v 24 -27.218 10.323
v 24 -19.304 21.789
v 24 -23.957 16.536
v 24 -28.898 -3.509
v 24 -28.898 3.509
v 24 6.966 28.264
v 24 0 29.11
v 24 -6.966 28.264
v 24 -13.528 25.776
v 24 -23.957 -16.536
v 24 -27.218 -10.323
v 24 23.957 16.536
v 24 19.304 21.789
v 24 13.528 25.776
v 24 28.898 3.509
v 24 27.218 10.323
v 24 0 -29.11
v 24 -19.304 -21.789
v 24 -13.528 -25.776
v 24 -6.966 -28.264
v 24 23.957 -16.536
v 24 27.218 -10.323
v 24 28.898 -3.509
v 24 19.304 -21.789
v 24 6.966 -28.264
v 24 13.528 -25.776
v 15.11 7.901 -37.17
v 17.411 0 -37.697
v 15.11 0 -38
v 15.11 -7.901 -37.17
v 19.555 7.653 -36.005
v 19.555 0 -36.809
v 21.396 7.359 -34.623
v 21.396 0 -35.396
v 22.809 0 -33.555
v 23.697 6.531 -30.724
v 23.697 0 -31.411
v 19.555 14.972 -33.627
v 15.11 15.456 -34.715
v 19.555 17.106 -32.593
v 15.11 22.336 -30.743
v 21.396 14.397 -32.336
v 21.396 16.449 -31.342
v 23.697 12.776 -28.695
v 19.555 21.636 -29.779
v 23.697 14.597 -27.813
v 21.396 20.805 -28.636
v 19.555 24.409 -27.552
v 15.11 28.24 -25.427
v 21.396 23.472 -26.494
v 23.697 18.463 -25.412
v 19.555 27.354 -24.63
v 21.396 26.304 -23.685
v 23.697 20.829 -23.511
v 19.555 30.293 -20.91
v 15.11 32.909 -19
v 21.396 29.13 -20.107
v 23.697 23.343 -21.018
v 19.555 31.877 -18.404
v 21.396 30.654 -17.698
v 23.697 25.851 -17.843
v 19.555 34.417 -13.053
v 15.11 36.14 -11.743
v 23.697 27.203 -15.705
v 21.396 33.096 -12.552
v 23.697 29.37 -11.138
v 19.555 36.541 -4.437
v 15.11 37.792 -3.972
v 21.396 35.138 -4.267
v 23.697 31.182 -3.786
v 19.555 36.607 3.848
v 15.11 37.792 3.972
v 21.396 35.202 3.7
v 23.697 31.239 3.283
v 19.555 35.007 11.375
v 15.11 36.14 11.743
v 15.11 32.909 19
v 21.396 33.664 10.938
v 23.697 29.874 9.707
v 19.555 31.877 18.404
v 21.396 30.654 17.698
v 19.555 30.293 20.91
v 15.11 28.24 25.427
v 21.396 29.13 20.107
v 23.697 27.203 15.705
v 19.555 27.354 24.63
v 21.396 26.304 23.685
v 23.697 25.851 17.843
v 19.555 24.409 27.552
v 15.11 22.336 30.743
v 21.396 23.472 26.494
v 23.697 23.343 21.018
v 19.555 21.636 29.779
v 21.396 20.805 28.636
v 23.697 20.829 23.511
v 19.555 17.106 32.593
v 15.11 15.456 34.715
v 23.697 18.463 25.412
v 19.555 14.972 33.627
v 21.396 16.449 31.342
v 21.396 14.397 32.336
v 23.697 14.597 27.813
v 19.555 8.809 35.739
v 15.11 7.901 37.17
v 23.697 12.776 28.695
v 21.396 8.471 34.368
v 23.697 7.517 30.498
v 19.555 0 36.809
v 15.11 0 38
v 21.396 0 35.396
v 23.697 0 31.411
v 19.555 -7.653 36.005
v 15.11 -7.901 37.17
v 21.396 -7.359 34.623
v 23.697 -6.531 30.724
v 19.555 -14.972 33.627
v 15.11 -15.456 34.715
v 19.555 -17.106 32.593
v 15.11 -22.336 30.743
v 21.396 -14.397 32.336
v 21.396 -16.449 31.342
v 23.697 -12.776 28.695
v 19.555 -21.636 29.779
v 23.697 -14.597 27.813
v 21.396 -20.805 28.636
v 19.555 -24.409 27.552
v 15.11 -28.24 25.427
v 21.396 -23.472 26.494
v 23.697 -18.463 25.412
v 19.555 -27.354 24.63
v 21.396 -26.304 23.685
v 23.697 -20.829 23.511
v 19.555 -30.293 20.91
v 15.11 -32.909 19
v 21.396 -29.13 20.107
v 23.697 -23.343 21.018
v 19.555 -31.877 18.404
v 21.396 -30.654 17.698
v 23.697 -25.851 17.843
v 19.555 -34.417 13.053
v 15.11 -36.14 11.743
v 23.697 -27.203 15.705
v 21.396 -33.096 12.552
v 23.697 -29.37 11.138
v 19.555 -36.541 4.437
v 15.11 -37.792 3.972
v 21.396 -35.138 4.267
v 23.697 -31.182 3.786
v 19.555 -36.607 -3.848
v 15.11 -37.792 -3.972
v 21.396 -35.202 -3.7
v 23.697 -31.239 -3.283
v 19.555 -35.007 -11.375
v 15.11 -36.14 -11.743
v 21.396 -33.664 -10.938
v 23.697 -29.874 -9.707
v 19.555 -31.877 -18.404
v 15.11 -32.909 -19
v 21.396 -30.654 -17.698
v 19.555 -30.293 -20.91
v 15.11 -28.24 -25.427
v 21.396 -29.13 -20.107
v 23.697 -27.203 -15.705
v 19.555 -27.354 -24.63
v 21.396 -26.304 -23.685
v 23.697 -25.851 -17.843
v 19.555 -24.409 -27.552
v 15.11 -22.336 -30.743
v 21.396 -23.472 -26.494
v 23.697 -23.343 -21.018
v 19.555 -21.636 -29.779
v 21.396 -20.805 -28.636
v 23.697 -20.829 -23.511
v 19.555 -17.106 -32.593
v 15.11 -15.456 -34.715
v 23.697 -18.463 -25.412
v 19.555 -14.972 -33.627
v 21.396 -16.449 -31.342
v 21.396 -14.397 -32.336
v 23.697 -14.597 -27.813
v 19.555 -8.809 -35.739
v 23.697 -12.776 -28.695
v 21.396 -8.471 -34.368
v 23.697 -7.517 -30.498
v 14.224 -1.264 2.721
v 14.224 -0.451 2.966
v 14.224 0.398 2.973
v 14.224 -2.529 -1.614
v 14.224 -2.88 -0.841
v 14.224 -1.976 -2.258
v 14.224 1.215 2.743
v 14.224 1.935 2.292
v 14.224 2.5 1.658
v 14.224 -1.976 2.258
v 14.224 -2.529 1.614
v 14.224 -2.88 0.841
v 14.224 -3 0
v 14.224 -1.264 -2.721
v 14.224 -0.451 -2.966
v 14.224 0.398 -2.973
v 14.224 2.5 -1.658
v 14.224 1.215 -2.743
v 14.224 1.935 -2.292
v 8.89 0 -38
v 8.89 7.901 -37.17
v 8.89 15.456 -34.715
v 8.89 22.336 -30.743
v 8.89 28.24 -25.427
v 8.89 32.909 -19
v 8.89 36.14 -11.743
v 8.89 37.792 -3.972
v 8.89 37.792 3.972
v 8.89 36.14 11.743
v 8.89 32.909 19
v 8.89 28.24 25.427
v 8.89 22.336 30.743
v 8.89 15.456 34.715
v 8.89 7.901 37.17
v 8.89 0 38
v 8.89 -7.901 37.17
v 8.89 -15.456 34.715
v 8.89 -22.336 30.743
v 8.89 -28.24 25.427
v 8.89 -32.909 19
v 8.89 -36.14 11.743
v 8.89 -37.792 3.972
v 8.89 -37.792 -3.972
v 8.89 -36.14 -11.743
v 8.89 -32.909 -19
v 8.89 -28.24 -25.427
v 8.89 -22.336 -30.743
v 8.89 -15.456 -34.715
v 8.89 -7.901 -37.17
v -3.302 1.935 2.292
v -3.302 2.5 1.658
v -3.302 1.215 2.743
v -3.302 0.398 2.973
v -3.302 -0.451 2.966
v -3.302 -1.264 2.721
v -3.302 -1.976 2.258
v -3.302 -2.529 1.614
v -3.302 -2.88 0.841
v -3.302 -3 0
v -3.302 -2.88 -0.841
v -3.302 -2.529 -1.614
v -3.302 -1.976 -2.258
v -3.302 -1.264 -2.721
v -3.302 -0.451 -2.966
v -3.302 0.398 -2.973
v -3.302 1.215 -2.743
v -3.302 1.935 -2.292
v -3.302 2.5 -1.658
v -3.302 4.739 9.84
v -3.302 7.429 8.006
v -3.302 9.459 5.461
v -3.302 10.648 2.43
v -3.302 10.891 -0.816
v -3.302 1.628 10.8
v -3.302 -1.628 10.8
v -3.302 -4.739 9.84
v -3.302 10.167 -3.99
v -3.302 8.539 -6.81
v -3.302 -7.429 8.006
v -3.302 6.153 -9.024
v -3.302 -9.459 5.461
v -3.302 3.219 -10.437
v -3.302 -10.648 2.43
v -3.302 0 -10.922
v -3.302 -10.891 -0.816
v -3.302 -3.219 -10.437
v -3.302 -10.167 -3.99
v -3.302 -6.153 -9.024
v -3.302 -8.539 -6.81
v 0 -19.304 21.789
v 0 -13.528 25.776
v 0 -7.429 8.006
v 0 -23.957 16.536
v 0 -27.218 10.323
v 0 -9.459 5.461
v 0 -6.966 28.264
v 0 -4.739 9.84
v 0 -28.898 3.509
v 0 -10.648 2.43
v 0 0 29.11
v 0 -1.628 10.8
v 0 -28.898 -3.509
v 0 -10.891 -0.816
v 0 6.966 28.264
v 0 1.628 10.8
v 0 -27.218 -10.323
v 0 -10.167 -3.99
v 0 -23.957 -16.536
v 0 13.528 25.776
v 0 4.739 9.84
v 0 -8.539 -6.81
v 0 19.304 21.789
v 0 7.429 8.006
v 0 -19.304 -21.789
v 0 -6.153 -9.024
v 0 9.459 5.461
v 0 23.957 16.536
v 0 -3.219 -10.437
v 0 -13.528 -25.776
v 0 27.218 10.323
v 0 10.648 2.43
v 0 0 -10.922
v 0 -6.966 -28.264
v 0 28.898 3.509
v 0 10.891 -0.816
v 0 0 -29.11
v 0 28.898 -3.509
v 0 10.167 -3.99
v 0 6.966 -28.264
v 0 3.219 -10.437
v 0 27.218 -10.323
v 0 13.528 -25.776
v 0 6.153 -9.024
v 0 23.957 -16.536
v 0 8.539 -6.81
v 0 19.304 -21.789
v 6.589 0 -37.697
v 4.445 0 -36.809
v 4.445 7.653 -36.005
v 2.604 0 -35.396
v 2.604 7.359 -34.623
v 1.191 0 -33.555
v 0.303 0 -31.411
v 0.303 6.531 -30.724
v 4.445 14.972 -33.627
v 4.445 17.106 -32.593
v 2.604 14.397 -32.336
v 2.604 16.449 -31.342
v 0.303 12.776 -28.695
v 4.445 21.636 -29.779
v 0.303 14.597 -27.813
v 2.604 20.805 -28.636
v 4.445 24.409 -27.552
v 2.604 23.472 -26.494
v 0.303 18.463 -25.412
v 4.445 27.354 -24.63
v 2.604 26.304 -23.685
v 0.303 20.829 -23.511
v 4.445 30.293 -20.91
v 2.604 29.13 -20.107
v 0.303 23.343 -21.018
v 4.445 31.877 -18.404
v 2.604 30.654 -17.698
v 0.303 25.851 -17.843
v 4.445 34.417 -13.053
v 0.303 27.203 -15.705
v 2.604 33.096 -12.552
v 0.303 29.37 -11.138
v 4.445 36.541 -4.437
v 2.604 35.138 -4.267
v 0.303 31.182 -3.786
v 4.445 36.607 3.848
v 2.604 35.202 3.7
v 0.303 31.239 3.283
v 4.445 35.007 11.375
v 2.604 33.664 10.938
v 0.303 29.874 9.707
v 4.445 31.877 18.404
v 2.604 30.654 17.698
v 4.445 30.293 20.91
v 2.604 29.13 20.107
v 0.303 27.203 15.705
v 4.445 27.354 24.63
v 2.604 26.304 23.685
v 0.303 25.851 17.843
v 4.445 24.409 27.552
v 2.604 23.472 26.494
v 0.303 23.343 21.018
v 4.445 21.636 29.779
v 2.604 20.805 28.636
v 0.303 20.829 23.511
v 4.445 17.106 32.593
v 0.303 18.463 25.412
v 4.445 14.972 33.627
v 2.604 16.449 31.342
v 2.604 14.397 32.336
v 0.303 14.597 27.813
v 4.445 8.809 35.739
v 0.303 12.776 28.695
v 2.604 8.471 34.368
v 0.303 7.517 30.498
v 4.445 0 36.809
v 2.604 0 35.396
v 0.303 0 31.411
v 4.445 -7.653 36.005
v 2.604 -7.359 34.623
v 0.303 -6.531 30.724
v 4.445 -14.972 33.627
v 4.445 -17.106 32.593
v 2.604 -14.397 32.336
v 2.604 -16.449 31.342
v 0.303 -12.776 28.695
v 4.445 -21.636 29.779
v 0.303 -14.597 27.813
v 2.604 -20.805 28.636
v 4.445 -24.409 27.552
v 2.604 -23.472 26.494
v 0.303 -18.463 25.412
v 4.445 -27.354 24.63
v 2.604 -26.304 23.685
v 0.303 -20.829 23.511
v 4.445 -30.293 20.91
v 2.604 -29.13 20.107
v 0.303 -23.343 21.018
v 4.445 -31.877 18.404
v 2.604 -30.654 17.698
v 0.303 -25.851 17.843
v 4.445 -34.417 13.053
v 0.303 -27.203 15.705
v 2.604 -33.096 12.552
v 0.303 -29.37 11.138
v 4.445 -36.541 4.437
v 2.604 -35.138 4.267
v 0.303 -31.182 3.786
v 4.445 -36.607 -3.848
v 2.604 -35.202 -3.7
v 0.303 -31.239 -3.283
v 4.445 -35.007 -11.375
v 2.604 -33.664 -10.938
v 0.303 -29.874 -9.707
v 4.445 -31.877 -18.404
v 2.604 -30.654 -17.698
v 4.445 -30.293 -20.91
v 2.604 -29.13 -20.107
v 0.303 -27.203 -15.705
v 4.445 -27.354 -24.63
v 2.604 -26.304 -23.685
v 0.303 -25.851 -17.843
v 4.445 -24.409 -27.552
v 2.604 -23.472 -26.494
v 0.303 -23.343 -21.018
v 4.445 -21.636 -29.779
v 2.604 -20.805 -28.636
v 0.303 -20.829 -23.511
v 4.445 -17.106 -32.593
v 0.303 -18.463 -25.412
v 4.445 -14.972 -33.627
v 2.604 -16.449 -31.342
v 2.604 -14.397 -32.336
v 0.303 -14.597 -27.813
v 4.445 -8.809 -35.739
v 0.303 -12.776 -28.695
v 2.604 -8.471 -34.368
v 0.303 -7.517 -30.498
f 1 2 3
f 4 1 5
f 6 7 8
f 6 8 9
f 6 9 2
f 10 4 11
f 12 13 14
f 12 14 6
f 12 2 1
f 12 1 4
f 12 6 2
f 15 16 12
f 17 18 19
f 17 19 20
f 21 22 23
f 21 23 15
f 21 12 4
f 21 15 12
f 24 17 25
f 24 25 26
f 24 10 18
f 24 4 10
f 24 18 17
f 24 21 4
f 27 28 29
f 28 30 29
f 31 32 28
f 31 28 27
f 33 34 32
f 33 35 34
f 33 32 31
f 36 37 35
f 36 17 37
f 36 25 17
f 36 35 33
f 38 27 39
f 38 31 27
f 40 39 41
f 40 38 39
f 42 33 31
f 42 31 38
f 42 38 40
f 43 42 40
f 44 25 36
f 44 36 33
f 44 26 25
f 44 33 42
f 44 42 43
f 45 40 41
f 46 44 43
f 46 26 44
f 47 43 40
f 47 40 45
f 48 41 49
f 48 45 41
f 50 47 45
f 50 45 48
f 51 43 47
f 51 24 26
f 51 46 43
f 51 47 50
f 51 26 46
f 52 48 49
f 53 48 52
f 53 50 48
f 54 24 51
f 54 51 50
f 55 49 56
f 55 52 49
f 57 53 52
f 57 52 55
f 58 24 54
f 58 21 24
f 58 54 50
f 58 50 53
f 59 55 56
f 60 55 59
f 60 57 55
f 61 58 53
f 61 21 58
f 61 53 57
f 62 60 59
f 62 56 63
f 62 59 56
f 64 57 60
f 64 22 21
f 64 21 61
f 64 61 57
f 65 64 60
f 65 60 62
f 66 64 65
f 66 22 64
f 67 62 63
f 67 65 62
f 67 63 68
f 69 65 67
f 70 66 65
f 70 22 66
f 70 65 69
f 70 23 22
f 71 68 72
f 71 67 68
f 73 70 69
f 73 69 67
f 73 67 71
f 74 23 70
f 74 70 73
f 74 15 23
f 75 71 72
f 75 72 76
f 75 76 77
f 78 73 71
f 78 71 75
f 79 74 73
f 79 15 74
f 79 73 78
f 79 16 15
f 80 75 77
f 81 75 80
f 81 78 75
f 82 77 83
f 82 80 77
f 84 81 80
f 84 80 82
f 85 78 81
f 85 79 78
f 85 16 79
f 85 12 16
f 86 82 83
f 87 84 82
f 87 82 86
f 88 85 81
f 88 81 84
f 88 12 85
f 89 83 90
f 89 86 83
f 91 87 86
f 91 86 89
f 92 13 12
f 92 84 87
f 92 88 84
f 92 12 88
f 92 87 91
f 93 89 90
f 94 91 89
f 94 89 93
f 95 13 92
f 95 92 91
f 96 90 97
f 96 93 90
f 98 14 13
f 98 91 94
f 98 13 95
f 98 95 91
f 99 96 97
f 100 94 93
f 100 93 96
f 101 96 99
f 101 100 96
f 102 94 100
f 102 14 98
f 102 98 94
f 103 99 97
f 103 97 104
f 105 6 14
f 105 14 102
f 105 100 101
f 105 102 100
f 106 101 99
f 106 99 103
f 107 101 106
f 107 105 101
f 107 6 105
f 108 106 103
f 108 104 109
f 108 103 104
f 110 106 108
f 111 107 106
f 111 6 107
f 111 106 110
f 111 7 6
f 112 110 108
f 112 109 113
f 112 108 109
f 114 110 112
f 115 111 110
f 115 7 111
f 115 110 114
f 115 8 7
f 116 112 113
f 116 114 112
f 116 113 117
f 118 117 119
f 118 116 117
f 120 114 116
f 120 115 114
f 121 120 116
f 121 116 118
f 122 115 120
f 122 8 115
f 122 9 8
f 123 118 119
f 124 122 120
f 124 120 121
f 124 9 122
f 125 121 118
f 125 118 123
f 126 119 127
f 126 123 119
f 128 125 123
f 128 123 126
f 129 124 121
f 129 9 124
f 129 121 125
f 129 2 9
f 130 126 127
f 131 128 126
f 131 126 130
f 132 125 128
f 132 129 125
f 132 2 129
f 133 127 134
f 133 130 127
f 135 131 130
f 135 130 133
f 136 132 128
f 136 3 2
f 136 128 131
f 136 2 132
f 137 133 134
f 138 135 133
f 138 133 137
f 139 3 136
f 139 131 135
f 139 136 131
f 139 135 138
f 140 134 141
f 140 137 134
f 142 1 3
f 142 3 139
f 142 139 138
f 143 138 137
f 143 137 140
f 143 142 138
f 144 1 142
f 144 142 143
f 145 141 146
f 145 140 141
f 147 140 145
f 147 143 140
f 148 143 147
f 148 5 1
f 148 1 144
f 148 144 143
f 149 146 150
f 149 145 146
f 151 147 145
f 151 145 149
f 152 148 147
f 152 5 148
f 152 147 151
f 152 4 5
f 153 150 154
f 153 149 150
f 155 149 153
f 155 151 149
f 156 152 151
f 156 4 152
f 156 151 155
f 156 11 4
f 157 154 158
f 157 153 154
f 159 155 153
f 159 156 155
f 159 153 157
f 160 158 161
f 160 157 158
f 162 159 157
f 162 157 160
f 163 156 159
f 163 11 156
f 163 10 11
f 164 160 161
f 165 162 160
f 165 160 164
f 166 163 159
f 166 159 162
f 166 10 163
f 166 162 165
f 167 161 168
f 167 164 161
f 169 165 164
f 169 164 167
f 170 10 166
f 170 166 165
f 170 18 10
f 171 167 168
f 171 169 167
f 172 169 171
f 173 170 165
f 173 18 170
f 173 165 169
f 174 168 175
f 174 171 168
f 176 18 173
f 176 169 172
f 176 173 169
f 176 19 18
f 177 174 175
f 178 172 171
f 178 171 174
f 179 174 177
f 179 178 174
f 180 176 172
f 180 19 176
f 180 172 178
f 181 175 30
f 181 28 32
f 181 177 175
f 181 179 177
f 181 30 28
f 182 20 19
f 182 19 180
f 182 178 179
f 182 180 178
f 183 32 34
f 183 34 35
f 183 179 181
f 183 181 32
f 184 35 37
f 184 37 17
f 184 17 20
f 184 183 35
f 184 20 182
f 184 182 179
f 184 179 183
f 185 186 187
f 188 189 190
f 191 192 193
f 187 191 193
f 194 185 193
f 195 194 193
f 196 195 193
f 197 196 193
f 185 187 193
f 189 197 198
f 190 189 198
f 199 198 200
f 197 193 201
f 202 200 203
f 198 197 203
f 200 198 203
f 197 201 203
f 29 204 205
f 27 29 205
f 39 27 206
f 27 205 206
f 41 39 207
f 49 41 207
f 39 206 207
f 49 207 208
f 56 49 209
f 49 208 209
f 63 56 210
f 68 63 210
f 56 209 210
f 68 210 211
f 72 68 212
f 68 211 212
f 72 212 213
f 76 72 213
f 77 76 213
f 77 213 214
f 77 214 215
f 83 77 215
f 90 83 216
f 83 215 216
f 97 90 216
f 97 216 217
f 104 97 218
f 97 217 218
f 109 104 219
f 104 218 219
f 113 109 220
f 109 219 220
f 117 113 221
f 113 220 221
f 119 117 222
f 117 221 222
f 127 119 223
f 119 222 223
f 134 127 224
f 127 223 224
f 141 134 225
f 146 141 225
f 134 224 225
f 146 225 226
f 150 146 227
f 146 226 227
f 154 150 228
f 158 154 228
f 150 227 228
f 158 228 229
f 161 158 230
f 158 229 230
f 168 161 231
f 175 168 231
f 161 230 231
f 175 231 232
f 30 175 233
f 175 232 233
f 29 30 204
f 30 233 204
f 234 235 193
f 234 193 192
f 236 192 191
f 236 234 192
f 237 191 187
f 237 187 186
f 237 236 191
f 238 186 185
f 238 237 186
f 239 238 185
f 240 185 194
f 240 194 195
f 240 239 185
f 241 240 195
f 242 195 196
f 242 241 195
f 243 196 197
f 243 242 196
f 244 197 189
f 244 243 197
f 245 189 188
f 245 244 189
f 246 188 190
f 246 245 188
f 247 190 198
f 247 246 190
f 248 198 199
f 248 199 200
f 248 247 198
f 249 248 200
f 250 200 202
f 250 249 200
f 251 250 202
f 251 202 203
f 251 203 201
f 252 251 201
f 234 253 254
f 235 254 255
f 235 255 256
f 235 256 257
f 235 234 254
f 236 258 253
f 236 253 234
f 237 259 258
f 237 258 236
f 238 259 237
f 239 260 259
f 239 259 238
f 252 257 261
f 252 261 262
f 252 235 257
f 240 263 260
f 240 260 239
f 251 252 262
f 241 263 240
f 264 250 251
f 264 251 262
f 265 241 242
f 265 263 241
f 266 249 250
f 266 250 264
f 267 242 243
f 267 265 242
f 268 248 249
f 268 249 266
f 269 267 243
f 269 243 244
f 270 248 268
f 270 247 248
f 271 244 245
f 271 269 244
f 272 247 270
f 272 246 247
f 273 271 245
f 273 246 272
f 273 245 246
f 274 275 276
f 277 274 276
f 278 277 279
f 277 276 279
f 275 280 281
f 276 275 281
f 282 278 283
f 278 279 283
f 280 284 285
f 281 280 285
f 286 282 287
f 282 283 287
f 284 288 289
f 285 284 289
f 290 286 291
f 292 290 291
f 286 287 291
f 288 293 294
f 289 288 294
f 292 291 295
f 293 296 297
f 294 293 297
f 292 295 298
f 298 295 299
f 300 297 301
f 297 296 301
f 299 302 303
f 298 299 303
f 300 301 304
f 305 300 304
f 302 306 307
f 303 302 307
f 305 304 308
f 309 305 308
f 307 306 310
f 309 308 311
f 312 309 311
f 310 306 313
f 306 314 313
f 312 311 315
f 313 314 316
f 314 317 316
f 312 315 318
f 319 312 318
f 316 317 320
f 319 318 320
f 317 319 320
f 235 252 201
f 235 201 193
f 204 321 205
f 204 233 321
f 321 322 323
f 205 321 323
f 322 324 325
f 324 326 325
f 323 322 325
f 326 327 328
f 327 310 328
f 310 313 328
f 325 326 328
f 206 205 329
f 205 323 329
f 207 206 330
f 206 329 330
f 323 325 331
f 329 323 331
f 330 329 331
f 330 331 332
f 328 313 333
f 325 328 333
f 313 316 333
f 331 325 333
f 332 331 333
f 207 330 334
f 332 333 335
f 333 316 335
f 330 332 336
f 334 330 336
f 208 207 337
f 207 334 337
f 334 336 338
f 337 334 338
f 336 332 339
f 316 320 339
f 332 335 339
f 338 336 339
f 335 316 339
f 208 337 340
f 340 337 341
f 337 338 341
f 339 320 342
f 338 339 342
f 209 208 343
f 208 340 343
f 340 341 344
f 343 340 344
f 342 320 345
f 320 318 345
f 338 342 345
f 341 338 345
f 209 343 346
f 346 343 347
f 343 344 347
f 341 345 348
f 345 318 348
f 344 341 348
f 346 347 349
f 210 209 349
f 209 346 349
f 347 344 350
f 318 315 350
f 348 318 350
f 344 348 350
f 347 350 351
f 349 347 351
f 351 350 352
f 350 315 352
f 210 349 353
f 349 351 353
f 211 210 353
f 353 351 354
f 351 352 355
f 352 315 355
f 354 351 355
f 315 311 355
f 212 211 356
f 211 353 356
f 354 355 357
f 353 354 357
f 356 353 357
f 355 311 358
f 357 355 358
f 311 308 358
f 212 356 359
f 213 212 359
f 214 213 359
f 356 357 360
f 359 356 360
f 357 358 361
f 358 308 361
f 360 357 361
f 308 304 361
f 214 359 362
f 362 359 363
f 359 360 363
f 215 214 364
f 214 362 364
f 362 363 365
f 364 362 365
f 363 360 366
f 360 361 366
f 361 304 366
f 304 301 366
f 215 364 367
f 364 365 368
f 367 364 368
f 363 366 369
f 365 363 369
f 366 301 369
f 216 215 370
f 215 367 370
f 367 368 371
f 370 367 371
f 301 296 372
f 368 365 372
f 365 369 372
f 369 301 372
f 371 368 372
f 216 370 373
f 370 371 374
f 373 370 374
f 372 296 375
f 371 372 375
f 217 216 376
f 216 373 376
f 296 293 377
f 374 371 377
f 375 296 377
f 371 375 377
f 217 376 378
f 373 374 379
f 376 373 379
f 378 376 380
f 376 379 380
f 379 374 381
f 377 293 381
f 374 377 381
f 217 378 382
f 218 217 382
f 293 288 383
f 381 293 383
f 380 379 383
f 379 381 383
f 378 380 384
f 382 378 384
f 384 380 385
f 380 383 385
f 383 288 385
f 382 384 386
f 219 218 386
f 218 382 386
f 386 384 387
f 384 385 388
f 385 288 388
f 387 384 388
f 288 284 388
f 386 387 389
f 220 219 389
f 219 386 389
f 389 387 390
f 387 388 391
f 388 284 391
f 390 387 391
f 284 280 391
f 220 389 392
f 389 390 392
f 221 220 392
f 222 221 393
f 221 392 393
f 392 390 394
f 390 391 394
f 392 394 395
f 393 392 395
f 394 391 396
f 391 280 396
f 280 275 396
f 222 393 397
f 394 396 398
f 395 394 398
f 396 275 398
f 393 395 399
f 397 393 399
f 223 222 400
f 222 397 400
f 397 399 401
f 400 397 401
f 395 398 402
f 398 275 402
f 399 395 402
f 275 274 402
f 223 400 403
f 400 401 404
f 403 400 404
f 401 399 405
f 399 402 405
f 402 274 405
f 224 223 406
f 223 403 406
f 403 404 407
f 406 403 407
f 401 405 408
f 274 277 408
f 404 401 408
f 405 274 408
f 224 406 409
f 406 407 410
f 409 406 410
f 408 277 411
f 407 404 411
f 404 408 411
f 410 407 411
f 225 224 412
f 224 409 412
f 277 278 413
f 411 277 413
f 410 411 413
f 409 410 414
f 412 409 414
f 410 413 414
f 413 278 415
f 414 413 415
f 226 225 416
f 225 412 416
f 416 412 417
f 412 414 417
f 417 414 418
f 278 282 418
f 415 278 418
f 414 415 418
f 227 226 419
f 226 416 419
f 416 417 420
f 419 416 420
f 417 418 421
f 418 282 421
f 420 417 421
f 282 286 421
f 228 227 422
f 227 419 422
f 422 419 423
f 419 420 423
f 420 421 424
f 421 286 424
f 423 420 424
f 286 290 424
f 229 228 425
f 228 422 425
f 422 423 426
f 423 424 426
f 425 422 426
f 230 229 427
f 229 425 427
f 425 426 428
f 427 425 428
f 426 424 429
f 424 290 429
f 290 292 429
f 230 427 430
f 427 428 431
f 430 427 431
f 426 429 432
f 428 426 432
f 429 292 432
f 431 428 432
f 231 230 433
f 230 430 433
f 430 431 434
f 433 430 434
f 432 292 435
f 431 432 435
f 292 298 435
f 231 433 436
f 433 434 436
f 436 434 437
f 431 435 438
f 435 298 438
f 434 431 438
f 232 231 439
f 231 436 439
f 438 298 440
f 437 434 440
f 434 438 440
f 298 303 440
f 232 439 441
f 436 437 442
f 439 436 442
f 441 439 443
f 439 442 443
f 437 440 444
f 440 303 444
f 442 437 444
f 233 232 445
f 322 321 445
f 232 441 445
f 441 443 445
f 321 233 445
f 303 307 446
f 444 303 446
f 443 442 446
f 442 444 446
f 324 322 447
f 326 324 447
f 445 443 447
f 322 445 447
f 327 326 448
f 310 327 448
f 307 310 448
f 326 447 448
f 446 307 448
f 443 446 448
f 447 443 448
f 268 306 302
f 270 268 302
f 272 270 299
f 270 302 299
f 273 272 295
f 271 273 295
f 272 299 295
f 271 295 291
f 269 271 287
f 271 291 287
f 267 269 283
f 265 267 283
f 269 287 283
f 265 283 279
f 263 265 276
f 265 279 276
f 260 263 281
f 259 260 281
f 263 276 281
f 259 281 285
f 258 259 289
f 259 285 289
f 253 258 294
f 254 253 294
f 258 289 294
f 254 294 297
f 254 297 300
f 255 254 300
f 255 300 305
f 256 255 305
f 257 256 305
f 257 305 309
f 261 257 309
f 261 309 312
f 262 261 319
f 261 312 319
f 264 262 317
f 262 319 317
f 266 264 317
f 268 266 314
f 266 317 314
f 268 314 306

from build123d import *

# Parameters (mm, degrees)
SKETCH1_R           = 38
BOSS_EXTRUDE1_DEPTH = 24
FILLET1_R           = 8.89
SKETCH4_R           = 10.922
BOSS_EXTRUDE2_DEPTH = 3.302
CUT_EXTRUDE3_DEPTH  = 17.526


with BuildPart() as part:
    # Sketch1 → Boss-Extrude1 (new body)
    with BuildSketch(Plane(origin=(0, 0, 0), x_dir=(0, 0, -1), z_dir=(1, 0, 0))):
        Circle(SKETCH1_R)
    extrude(amount=BOSS_EXTRUDE1_DEPTH)

    # Fillet1
    fillet1_edges = [part.edges().sort_by_distance(p)[0] for p in [
        (0, 0, 38),
        (24, 0, 38),
    ]]
    fillet(fillet1_edges, radius=FILLET1_R)

    # Sketch4 → Boss-Extrude2 (add)
    with BuildSketch(Plane.ZY):
        with Locations(Location((0, 0, 0), (0, 0, 180))):
            Circle(SKETCH4_R)
    extrude(amount=BOSS_EXTRUDE2_DEPTH)

    # Sketch5 → Cut-Extrude3 (cut)
    with BuildSketch(Plane.ZY.offset(3.302)):
        with BuildLine():
            Line((-1.658312395, 2.5), (1.658312395, 2.5))
            ThreePointArc((1.658312395, 2.5), (0, -3), (-1.658312395, 2.5))
        make_face()
    extrude(amount=-CUT_EXTRUDE3_DEPTH, mode=Mode.SUBTRACT)


solid = part.part
